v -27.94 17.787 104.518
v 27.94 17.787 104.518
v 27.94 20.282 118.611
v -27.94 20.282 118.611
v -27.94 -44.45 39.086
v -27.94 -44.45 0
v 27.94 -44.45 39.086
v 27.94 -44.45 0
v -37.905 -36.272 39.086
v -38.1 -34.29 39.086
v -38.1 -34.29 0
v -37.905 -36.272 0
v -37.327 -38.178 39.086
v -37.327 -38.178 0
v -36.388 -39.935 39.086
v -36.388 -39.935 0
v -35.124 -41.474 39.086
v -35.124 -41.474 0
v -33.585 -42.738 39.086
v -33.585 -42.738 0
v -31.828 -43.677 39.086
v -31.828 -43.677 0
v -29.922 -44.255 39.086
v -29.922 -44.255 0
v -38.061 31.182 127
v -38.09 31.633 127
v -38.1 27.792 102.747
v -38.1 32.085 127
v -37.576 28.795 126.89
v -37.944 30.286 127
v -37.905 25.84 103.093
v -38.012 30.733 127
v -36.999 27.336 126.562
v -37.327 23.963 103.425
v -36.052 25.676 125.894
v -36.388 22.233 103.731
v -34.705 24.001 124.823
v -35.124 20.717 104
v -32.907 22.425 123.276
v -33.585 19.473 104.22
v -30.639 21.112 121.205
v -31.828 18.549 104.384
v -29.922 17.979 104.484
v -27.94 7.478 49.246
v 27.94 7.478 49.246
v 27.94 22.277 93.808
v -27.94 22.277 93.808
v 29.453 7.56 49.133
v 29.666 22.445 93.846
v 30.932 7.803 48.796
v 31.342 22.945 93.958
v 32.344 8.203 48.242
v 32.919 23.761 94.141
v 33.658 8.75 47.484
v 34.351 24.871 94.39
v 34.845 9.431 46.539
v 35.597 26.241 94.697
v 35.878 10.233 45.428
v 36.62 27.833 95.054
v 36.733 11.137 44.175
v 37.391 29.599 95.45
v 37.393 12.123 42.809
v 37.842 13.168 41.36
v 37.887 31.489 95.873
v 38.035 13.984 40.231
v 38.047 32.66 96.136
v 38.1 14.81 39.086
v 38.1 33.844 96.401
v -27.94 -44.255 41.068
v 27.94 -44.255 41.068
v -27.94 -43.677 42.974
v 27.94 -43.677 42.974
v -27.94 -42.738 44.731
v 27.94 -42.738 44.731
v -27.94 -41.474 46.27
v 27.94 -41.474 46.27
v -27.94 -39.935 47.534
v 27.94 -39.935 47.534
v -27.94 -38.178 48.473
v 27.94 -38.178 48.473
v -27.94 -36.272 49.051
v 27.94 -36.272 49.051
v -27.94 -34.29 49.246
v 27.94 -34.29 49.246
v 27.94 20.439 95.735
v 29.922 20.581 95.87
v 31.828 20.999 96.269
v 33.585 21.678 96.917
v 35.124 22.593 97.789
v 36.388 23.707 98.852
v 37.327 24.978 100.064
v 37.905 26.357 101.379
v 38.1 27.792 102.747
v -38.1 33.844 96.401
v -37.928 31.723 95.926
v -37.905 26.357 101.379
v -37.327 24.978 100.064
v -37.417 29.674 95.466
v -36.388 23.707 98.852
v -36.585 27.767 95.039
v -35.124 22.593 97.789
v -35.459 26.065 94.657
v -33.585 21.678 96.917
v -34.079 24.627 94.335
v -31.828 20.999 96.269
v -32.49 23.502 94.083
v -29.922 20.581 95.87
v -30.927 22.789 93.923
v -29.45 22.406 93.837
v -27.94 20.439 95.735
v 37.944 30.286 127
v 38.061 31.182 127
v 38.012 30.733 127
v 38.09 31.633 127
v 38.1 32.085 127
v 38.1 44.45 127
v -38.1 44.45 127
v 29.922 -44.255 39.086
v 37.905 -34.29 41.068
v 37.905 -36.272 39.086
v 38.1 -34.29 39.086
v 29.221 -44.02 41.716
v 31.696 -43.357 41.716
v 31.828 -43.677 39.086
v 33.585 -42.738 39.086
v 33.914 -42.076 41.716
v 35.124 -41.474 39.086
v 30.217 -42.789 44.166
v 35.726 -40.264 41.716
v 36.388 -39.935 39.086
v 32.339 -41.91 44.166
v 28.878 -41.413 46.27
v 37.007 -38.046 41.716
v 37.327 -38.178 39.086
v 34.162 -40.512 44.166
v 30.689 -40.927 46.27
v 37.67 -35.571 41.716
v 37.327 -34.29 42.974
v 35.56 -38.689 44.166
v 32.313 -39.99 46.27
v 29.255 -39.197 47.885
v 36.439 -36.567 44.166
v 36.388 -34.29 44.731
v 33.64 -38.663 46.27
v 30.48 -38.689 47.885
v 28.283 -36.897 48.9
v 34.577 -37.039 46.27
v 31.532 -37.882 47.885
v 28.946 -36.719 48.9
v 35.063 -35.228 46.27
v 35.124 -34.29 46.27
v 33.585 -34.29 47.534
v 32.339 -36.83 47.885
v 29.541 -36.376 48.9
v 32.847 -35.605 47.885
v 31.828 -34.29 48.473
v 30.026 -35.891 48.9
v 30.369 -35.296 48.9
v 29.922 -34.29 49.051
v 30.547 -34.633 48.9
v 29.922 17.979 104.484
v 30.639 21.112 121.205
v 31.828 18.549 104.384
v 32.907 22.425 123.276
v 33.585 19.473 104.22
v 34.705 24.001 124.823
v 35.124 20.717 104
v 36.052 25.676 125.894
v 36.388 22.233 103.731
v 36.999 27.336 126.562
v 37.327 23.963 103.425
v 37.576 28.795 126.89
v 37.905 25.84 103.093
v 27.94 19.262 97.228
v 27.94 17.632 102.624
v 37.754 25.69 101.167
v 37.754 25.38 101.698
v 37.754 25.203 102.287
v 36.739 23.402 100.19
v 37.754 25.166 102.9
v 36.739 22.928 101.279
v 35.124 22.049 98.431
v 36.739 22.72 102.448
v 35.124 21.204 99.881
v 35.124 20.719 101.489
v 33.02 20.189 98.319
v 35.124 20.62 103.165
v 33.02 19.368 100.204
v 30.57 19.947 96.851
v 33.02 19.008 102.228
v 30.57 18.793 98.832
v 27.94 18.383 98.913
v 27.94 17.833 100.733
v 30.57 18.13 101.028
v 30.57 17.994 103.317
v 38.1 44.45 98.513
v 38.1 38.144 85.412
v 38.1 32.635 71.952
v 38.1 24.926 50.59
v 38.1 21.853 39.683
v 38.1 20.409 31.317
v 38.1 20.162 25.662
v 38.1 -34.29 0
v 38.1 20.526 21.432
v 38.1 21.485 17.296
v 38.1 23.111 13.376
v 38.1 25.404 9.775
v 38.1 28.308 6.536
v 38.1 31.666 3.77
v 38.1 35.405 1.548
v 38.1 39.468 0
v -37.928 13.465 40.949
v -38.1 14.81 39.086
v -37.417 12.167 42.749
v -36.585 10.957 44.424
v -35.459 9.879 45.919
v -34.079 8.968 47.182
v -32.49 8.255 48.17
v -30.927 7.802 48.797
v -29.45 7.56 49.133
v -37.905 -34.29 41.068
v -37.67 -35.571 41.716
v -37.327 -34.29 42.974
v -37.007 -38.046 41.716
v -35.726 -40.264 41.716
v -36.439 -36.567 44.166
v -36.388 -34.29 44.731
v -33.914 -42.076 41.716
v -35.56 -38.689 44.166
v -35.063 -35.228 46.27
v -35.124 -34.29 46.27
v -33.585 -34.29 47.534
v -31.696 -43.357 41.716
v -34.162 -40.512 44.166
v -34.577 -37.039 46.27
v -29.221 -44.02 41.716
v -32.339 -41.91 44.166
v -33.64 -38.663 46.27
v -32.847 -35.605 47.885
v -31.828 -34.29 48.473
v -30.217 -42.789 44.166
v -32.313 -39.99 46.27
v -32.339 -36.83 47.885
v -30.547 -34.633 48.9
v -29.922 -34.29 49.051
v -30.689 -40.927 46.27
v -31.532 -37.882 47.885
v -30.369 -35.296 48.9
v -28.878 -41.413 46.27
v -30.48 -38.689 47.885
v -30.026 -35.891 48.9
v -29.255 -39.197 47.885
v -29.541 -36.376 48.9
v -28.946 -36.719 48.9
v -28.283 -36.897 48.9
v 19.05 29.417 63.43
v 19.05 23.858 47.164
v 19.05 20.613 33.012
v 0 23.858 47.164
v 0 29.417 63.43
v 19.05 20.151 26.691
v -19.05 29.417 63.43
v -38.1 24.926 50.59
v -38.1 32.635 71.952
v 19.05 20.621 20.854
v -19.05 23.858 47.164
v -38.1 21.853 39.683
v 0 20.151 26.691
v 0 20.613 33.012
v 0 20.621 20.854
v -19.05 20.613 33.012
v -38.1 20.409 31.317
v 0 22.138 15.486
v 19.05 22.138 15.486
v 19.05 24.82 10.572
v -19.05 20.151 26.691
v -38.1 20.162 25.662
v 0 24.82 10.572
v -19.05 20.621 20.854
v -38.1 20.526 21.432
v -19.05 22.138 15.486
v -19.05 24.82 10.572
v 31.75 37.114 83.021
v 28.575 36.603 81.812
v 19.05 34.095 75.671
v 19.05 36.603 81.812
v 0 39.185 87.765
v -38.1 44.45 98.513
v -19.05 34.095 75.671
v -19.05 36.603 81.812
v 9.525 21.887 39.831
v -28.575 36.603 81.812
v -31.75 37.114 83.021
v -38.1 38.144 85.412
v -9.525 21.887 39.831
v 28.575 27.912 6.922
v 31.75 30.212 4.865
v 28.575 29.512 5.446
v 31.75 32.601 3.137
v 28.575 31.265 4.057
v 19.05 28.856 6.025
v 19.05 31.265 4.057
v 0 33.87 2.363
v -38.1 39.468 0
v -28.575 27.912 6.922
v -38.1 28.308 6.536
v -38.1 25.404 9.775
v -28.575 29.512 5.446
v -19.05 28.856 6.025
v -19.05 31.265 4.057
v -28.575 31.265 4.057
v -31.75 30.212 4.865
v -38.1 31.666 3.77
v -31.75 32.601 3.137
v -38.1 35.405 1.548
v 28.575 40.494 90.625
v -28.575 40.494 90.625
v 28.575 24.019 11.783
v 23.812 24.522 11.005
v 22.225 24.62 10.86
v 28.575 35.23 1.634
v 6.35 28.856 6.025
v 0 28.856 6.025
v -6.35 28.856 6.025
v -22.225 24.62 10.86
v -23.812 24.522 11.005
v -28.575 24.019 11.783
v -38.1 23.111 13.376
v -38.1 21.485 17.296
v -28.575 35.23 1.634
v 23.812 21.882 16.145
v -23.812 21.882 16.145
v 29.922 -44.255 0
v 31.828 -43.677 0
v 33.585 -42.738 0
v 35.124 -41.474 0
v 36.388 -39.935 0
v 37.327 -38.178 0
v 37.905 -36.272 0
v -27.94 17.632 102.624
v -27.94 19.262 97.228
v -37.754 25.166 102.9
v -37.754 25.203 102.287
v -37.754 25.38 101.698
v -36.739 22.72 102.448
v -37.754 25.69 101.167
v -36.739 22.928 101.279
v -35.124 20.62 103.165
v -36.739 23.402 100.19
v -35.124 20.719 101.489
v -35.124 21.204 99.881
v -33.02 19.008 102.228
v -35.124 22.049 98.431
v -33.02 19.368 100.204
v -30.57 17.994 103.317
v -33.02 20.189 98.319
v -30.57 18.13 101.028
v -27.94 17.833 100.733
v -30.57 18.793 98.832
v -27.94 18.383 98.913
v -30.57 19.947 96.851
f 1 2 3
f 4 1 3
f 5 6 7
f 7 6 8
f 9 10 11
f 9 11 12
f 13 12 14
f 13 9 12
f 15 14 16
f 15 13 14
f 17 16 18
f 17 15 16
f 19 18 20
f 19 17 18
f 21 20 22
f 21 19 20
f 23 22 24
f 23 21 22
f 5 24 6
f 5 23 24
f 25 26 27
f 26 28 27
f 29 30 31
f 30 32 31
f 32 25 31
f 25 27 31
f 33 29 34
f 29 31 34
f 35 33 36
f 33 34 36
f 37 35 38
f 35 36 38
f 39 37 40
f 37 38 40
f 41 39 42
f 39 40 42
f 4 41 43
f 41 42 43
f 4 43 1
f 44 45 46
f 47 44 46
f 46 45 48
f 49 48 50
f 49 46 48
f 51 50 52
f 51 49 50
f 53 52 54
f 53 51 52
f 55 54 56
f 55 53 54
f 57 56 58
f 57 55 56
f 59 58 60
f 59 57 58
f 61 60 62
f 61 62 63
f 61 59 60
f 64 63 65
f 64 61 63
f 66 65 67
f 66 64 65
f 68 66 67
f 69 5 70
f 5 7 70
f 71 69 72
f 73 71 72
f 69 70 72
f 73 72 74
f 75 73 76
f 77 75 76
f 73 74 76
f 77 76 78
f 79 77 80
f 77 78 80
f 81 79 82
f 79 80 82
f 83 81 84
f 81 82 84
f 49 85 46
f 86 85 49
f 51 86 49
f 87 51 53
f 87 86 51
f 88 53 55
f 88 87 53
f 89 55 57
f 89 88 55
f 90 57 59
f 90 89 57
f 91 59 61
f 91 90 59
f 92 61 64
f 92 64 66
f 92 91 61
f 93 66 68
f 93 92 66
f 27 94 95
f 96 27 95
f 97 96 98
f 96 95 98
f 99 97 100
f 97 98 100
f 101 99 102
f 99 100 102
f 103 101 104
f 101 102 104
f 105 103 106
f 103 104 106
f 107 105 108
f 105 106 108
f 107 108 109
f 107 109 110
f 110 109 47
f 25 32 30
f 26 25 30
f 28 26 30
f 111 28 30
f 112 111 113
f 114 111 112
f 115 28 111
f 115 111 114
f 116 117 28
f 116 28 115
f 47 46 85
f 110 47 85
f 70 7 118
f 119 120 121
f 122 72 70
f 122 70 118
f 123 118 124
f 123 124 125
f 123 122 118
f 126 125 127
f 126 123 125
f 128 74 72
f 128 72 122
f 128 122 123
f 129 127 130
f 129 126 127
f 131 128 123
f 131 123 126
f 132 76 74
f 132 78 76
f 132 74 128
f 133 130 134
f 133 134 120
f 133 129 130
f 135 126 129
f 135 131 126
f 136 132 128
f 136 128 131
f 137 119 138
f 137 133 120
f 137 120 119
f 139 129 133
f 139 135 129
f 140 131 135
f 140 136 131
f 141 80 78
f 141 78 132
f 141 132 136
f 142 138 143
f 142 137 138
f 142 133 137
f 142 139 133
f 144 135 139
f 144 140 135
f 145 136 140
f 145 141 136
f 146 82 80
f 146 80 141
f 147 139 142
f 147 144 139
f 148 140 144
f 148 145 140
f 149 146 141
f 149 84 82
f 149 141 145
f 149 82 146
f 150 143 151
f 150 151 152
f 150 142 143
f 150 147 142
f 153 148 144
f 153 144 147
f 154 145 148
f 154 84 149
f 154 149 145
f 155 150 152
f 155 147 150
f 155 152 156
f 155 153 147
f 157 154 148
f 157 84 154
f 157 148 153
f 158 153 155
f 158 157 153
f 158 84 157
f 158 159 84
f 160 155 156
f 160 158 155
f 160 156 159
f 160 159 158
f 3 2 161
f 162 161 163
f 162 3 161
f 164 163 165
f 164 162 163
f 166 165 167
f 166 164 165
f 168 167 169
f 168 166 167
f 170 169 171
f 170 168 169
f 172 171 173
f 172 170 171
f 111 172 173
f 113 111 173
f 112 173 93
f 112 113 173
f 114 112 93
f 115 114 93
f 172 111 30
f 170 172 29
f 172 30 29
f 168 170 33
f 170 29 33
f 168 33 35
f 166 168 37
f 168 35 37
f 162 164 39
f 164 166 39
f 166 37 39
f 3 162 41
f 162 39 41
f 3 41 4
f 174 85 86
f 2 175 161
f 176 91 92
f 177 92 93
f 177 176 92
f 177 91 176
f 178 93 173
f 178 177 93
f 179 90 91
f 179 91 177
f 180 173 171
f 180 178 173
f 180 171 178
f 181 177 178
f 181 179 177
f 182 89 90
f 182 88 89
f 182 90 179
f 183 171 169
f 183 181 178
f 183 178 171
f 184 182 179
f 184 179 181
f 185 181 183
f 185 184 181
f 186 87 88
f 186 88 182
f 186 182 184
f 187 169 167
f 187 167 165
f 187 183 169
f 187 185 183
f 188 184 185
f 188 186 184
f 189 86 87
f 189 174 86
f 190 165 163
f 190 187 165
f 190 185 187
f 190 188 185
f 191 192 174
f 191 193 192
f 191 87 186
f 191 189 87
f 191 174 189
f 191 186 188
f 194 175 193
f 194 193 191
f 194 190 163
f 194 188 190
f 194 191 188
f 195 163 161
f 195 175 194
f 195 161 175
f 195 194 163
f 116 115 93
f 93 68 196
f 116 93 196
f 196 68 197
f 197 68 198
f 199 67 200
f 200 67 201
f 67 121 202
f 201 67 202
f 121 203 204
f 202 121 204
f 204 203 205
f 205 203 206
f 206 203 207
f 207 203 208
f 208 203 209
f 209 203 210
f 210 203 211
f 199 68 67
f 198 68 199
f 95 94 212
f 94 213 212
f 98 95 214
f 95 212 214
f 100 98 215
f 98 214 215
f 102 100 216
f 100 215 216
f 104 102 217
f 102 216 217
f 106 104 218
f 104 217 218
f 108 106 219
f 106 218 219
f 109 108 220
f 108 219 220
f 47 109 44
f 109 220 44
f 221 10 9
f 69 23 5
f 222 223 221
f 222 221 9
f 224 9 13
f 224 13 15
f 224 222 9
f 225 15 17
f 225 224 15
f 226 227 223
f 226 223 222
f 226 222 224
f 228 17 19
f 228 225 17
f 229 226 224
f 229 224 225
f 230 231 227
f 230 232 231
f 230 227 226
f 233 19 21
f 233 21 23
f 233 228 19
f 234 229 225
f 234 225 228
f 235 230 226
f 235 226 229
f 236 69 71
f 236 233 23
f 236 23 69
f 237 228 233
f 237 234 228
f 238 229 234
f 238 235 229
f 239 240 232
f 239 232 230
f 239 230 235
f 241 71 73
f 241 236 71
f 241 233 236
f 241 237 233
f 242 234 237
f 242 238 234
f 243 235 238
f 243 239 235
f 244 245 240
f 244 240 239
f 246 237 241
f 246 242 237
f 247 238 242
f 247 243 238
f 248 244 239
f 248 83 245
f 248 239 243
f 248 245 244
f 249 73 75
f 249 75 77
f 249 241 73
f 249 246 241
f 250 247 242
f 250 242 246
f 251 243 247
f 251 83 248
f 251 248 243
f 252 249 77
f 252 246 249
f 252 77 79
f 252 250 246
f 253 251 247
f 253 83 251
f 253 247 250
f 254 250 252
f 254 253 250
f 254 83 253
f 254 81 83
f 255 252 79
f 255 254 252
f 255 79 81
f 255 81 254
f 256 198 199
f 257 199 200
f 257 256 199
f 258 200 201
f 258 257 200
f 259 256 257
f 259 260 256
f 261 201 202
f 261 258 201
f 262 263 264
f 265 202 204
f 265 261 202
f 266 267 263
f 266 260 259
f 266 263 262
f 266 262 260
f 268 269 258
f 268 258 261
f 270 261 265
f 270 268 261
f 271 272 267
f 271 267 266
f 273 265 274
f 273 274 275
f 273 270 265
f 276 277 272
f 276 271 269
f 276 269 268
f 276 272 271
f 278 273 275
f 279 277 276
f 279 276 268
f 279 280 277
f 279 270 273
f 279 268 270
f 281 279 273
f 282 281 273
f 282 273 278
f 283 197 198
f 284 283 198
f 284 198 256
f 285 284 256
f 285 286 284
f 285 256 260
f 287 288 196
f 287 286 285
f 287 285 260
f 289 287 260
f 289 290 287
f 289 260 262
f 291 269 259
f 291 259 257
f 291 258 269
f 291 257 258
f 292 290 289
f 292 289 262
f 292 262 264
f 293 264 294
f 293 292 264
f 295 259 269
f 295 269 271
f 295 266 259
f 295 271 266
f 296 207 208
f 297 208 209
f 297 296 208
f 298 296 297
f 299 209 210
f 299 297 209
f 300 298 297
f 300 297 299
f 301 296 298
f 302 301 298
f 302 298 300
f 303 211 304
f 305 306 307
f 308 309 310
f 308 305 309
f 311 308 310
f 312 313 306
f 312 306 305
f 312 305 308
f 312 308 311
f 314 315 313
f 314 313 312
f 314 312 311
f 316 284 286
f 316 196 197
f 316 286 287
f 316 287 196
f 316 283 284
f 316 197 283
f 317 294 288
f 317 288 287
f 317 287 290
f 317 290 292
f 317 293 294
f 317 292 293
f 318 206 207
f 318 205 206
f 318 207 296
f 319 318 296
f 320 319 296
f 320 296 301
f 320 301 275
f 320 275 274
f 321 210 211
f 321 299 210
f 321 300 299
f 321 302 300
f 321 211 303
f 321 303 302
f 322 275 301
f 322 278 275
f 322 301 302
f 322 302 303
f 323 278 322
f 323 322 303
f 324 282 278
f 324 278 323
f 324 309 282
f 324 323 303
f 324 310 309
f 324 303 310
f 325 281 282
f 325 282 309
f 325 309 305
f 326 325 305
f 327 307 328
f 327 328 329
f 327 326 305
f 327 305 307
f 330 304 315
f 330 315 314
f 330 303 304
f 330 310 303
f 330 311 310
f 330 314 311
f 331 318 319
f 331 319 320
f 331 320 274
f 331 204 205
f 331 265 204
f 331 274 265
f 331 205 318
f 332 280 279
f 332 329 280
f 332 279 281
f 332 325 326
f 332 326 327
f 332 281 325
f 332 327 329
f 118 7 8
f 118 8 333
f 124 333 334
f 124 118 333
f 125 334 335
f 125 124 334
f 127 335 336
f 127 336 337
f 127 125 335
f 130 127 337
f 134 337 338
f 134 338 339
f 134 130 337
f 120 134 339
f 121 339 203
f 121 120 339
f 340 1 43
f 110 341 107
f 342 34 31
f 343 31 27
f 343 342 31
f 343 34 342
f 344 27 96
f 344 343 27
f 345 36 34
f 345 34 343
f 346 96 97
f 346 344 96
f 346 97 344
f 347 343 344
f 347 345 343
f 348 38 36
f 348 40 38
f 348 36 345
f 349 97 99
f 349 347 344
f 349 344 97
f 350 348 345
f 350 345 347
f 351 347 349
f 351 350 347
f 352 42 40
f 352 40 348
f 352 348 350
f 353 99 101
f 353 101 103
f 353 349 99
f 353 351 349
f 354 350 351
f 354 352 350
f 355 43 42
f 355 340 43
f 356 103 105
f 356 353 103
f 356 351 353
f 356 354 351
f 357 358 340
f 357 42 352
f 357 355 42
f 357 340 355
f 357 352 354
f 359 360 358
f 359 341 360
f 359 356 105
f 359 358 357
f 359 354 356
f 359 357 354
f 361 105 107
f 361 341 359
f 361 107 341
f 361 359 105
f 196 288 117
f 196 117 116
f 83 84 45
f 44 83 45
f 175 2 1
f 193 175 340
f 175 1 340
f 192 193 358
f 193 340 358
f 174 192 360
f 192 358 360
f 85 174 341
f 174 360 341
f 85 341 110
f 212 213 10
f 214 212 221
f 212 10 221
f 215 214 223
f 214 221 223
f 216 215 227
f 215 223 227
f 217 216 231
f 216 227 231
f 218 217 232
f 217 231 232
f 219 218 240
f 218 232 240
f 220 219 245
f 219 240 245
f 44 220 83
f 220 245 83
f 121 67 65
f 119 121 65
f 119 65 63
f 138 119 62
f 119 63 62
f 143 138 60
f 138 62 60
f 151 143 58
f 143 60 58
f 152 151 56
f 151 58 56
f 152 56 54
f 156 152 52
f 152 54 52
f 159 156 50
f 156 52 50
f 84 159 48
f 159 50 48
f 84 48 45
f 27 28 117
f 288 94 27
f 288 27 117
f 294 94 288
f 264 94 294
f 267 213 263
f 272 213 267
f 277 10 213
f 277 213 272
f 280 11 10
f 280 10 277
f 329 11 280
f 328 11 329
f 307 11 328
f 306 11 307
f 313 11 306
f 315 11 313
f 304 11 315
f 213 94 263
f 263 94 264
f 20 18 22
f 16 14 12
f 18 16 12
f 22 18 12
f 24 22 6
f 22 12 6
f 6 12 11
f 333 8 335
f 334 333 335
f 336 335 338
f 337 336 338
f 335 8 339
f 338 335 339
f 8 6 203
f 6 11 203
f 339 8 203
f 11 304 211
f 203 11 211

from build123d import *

# Parameters (mm, degrees)
F0_W      = 76.2
F0_H      = 88.9
F1_DEPTH  = 127
F4_R      = 10.16
F5_DEPTH  = 76.201
F7_DEPTH  = 93.98
F10_DEPTH = 239.014
F11_R     = 10.16


with BuildPart() as f1:
    # F0 (on Top) → F1 (new body)
    with BuildSketch(Plane.XY):
        Rectangle(F0_W, F0_H)
    extrude(amount=F1_DEPTH)

    # F4
    f4_edges = [f1.edges().sort_by_distance(p)[0] for p in [
        (-38.1, -44.45, 63.5),
        (38.1, -44.45, 63.5),
    ]]
    fillet(f4_edges, radius=F4_R)

    # F3 (on face) → F5 (cut, through all)
    with BuildSketch(Plane.YZ.offset(38.1)):
        Polygon((-45.809648931, 49.2461211979), (7.4780625291, 49.2461211979), (22.2772937268, 93.8081741333), (16.8910045177, 99.4559377432), (22.2772937268, 129.883646965), (-45.809648931, 129.883646965), align=None)
    extrude(amount=-F5_DEPTH, mode=Mode.SUBTRACT)

    # F6 (on face) → F7 (cut)
    with BuildSketch(Plane(origin=(-38.1, 0, 0), x_dir=(0, -1, 0), z_dir=(-1, 0, 0))):
        with BuildLine():
            add(Edge.make_bspline(
                [(-48.9771775901, 121.8602433801), (-46.9556517053, 122.0553146871), (-45.5208898805, 120.6970387614), (-44.45, 118.2441702513)],
                knots=[0, 0, 0, 0, 0.0422373961, 0.0422373961, 0.0422373961, 0.0422373961], degree=3))
            add(Edge.make_bspline(
                [(-41.446827352, 0), (-59.6918978557, -6.5861209891), (-127.8152635251, 4.6198323194), (-62.2027540723, 120.584014117), (-48.9771775901, 121.8602433801)],
                knots=[0.5271103159, 0.5271103159, 0.5271103159, 0.5271103159, 0.7236671981, 1, 1, 1, 1], degree=3))
            Line((-41.446827352, 0), (-44.45, 0))
            Line((-44.45, 0), (-44.45, 118.2441702513))
        make_face()
    extrude(amount=-F7_DEPTH, mode=Mode.SUBTRACT)

    # F9 (on offset) → F10 (cut)
    with BuildSketch(Plane.YZ.offset(-192.024)):
        with BuildLine():
            add(Edge.make_bspline(
                [(58.8335432112, 110.7725277543), (50.7674633443, 117.1402640213), (25.8725163169, 57.9043750617), (12.2630217786, 9.8618308242), (73.8166292381, -18.5103461722), (69.968843038, 101.9818073895), (58.8335432112, 110.7725277543)],
                knots=[0, 0, 0, 0, 0.243523168, 0.4811201123, 0.6638139549, 1, 1, 1, 1], degree=3))
        make_face()
    extrude(amount=F10_DEPTH, mode=Mode.SUBTRACT)

    # F11
    f11_edges = [f1.edges().sort_by_distance(p)[0] for p in [
        (0, 16.891005, 99.455938),
        (-38.1, 14.877678, 71.527148),
        (38.1, 14.877678, 71.527148),
        (-38.1, -13.405969, 49.246121),
        (-38.1, 19.328919, 113.227969),
        (-38.1, 19.584149, 96.632056),
        (38.1, 19.584149, 96.632056),
        (38.1, 19.328919, 113.227969),
        (0, 21.766833, 127),
    ]]
    fillet(f11_edges, radius=F11_R)


solid = f1.part
